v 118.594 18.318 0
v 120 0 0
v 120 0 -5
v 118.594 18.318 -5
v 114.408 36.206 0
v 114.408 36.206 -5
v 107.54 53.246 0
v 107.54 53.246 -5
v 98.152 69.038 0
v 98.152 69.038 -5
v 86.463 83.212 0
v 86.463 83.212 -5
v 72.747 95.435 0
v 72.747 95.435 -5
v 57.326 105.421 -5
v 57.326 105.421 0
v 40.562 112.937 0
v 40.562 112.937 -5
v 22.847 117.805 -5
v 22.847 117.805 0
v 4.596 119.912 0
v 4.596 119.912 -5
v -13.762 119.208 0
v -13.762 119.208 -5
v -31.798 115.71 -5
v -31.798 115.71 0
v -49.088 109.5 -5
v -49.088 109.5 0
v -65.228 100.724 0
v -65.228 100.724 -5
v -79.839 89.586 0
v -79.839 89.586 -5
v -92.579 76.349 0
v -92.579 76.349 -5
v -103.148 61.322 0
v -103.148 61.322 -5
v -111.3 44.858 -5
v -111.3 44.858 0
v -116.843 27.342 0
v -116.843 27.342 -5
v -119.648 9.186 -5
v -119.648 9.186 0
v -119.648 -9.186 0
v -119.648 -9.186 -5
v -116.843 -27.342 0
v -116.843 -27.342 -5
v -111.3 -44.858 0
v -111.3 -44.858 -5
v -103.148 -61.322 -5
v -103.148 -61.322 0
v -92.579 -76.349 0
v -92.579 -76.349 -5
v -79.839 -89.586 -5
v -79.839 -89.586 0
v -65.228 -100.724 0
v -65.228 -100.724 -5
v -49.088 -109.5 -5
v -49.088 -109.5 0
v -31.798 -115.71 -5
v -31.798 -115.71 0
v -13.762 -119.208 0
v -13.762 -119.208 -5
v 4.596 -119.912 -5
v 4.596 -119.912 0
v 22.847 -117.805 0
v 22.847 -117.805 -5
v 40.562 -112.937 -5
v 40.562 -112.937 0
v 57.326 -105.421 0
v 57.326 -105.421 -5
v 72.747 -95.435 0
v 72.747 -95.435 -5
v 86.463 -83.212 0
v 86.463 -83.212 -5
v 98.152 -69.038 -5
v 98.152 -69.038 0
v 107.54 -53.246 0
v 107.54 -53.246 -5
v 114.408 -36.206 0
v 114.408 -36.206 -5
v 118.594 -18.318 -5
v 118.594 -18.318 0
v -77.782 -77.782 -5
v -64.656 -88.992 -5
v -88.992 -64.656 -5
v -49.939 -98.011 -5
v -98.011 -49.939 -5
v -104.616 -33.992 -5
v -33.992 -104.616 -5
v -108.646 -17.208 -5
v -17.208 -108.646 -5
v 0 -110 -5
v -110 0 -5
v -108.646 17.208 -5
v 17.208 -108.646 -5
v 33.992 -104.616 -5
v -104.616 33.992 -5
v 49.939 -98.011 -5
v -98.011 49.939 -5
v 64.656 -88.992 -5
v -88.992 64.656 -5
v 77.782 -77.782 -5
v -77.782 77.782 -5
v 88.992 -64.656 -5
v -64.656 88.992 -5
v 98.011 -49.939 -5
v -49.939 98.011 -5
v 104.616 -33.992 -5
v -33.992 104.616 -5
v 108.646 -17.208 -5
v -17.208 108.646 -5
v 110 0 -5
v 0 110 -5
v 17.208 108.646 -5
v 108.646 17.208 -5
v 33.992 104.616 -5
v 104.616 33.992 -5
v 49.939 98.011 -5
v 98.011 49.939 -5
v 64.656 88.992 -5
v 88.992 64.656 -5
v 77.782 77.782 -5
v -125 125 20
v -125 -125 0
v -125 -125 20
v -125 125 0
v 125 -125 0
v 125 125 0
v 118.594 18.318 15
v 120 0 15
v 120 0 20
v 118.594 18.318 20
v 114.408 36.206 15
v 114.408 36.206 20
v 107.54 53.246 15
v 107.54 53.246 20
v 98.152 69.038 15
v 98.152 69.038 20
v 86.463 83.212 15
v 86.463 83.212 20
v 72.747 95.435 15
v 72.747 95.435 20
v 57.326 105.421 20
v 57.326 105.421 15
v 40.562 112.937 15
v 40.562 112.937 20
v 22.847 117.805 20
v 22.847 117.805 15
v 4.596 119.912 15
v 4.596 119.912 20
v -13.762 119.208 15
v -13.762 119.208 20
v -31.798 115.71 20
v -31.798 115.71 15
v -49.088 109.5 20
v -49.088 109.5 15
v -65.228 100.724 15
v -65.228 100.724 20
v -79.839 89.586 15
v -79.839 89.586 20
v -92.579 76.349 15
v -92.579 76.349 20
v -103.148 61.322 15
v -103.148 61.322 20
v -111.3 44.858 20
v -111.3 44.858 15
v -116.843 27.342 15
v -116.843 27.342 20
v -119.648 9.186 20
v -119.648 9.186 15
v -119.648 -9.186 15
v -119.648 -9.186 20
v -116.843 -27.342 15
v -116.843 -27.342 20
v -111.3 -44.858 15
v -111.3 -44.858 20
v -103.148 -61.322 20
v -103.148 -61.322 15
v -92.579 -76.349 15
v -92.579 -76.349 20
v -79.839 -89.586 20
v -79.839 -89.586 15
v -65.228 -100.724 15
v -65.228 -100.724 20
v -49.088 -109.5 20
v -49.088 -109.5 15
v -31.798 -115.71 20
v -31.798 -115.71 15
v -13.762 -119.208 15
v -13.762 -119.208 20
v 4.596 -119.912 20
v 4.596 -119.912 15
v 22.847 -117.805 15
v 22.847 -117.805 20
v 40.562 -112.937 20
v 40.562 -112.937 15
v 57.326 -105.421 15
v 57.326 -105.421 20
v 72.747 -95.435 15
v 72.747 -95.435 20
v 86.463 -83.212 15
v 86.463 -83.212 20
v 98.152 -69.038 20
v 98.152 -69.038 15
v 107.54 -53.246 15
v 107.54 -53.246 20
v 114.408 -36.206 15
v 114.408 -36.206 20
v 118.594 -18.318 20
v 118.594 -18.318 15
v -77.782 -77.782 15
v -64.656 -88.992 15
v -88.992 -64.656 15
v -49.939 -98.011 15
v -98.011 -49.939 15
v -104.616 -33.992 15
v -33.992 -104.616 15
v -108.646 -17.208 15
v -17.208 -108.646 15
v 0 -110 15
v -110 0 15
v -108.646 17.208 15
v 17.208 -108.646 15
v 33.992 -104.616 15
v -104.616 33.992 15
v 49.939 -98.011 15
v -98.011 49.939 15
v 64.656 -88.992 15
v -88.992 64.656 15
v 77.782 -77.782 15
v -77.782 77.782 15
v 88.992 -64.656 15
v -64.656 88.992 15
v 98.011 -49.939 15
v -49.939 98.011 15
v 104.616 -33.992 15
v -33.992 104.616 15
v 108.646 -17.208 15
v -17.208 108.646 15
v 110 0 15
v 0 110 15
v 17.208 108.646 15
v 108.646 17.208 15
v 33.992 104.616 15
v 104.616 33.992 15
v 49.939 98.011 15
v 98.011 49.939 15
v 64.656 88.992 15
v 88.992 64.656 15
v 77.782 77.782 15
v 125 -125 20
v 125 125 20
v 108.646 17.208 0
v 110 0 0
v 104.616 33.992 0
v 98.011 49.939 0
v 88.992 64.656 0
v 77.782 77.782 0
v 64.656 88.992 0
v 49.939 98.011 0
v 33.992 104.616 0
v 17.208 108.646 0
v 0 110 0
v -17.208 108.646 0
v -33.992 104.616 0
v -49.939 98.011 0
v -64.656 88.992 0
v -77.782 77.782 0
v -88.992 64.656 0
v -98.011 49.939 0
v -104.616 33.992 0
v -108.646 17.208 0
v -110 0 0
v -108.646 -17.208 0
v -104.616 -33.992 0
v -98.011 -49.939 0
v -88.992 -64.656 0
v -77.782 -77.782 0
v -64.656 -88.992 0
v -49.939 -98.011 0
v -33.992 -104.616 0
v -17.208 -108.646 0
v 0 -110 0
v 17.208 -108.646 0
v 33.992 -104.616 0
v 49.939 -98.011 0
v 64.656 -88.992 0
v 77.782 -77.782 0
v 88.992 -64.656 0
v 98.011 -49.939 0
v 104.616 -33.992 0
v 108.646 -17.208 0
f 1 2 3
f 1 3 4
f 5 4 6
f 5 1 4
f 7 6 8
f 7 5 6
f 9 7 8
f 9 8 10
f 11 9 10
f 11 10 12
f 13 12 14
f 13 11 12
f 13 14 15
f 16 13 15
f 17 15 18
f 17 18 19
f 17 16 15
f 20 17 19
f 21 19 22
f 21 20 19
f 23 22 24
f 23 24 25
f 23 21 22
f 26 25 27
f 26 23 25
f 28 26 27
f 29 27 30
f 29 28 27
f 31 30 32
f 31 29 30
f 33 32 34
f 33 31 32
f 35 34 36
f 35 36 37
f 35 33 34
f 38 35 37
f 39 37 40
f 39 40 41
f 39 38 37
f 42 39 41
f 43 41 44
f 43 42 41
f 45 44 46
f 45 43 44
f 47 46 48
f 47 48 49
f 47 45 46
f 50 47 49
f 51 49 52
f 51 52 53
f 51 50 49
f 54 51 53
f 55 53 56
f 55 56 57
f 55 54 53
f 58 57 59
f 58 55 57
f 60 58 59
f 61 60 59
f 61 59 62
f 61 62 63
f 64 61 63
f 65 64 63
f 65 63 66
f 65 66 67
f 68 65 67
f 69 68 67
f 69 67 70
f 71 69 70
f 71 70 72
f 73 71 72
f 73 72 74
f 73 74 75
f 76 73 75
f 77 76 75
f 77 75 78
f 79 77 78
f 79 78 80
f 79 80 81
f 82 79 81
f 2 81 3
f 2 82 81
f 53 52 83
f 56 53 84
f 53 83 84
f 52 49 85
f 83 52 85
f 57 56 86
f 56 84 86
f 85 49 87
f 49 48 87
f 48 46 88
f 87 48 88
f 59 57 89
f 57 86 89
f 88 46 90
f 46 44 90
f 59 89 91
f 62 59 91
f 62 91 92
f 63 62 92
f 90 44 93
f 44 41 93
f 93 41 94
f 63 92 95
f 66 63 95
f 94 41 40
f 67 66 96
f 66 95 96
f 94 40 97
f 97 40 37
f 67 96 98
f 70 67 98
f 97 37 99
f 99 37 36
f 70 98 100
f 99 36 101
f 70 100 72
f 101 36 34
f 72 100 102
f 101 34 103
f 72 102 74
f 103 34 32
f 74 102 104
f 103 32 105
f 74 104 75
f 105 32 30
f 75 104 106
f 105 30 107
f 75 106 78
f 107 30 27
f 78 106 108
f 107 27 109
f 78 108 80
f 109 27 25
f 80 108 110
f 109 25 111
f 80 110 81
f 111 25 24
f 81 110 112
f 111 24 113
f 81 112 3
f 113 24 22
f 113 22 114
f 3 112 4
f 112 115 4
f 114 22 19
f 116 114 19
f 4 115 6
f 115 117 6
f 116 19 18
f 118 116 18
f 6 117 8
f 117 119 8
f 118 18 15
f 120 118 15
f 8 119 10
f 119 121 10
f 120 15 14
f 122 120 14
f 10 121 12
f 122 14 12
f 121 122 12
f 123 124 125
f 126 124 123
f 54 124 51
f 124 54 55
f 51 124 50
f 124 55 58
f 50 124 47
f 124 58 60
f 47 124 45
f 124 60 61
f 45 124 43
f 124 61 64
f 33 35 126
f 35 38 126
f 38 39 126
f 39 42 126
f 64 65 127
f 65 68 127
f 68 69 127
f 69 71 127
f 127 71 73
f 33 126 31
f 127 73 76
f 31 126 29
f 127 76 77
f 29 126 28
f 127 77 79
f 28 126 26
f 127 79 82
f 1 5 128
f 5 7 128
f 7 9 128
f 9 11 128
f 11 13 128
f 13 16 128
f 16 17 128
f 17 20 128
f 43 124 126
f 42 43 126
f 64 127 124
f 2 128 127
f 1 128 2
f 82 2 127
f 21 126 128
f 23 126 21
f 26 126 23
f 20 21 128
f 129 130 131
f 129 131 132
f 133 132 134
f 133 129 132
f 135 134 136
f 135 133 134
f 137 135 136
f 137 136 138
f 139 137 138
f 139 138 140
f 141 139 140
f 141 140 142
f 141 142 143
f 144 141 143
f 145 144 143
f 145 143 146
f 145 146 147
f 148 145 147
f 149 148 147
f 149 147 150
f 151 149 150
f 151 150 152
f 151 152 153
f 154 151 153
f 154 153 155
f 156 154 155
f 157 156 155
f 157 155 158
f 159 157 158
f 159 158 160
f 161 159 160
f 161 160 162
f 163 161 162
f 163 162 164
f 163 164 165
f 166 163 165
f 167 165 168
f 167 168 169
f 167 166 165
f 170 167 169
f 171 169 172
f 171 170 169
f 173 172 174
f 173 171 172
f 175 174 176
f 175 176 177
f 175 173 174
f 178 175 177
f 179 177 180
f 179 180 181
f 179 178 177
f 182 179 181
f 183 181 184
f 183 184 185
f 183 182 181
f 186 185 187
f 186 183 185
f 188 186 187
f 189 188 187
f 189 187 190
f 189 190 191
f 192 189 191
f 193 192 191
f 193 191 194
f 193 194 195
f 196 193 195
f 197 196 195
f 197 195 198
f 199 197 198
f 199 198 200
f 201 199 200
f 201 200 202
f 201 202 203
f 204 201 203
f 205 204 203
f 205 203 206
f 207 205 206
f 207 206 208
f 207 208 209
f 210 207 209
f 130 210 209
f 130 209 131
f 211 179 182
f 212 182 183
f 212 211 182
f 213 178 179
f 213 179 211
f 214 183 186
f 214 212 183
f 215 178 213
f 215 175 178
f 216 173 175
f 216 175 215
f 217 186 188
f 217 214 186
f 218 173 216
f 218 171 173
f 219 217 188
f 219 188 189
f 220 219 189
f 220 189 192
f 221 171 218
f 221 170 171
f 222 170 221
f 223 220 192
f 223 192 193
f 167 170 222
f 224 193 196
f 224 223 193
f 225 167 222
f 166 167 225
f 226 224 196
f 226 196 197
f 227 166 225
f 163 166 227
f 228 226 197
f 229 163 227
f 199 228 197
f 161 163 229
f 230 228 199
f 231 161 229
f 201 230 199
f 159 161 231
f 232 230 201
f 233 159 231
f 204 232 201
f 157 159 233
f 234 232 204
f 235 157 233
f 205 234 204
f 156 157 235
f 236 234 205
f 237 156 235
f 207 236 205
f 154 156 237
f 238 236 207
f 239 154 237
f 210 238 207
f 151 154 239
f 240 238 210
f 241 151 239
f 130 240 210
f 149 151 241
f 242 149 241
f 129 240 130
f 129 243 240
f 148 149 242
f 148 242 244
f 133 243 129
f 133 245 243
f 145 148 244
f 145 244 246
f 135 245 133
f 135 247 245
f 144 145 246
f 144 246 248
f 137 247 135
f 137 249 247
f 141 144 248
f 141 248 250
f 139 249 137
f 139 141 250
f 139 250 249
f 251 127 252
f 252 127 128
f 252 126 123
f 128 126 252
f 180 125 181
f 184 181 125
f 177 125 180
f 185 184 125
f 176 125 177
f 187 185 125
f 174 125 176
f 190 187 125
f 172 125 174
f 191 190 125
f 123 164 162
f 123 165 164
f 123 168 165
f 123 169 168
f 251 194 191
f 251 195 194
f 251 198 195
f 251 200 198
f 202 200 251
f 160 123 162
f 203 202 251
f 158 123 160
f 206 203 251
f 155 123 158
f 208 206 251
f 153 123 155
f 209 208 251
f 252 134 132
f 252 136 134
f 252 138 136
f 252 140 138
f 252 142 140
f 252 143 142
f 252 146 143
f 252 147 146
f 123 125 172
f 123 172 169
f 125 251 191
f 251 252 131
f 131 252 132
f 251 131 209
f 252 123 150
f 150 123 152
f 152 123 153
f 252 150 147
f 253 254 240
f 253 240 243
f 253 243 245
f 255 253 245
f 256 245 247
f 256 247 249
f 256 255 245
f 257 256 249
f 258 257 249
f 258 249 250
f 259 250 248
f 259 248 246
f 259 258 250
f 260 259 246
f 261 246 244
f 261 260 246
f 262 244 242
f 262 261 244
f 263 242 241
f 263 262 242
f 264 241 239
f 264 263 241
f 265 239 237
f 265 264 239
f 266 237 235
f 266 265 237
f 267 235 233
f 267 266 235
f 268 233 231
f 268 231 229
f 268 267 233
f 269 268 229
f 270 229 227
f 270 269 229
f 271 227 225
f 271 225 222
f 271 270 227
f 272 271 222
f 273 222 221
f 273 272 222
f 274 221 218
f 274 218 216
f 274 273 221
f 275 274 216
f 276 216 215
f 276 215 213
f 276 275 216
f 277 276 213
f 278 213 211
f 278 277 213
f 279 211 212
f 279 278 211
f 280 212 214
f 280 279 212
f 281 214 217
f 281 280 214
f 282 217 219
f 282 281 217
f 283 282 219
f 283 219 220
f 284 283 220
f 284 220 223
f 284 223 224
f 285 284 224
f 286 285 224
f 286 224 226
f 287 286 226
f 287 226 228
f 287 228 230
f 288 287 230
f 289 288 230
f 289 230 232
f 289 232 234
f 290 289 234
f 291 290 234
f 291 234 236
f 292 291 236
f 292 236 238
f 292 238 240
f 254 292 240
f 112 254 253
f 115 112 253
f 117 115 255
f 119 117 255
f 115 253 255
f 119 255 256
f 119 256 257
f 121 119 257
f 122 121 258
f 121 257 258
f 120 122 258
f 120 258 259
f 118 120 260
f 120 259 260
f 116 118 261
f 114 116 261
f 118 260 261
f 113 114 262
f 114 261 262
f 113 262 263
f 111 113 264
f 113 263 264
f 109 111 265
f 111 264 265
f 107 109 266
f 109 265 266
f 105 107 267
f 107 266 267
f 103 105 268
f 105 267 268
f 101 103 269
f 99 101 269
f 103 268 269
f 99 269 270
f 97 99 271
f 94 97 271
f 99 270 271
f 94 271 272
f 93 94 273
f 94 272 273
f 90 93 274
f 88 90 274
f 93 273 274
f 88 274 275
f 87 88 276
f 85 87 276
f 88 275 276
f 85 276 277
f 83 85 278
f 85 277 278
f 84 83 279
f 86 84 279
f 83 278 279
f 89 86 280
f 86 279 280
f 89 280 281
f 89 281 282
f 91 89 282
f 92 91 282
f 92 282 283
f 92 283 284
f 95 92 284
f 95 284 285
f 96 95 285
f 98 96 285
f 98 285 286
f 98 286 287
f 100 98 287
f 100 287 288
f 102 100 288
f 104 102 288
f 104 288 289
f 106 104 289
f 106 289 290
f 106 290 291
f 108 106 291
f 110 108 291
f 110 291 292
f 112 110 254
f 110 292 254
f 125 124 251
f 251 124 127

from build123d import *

# Parameters (mm, degrees)
F0_W          = 250
F0_H          = 250
F0_R          = 120
F1_DEPTH      = 20
F0_R_2        = 110
F2_DEPTH      = 15
F2_DEPTH_BACK = 5


with BuildPart() as f1:
    # F0 (on Top) → F1 (new body)
    with BuildSketch(Plane.XY):
        Rectangle(F0_W, F0_H)
        Circle(F0_R, mode=Mode.SUBTRACT)
    extrude(amount=F1_DEPTH)

    # F0 (on Top) → F2 (join, two sides)
    with BuildSketch(Plane.XY) as f2_sk:
        Circle(F0_R)
        Circle(F0_R_2, mode=Mode.SUBTRACT)
    extrude(amount=F2_DEPTH)
    extrude(f2_sk.sketch, amount=-F2_DEPTH_BACK)


solid = f1.part
